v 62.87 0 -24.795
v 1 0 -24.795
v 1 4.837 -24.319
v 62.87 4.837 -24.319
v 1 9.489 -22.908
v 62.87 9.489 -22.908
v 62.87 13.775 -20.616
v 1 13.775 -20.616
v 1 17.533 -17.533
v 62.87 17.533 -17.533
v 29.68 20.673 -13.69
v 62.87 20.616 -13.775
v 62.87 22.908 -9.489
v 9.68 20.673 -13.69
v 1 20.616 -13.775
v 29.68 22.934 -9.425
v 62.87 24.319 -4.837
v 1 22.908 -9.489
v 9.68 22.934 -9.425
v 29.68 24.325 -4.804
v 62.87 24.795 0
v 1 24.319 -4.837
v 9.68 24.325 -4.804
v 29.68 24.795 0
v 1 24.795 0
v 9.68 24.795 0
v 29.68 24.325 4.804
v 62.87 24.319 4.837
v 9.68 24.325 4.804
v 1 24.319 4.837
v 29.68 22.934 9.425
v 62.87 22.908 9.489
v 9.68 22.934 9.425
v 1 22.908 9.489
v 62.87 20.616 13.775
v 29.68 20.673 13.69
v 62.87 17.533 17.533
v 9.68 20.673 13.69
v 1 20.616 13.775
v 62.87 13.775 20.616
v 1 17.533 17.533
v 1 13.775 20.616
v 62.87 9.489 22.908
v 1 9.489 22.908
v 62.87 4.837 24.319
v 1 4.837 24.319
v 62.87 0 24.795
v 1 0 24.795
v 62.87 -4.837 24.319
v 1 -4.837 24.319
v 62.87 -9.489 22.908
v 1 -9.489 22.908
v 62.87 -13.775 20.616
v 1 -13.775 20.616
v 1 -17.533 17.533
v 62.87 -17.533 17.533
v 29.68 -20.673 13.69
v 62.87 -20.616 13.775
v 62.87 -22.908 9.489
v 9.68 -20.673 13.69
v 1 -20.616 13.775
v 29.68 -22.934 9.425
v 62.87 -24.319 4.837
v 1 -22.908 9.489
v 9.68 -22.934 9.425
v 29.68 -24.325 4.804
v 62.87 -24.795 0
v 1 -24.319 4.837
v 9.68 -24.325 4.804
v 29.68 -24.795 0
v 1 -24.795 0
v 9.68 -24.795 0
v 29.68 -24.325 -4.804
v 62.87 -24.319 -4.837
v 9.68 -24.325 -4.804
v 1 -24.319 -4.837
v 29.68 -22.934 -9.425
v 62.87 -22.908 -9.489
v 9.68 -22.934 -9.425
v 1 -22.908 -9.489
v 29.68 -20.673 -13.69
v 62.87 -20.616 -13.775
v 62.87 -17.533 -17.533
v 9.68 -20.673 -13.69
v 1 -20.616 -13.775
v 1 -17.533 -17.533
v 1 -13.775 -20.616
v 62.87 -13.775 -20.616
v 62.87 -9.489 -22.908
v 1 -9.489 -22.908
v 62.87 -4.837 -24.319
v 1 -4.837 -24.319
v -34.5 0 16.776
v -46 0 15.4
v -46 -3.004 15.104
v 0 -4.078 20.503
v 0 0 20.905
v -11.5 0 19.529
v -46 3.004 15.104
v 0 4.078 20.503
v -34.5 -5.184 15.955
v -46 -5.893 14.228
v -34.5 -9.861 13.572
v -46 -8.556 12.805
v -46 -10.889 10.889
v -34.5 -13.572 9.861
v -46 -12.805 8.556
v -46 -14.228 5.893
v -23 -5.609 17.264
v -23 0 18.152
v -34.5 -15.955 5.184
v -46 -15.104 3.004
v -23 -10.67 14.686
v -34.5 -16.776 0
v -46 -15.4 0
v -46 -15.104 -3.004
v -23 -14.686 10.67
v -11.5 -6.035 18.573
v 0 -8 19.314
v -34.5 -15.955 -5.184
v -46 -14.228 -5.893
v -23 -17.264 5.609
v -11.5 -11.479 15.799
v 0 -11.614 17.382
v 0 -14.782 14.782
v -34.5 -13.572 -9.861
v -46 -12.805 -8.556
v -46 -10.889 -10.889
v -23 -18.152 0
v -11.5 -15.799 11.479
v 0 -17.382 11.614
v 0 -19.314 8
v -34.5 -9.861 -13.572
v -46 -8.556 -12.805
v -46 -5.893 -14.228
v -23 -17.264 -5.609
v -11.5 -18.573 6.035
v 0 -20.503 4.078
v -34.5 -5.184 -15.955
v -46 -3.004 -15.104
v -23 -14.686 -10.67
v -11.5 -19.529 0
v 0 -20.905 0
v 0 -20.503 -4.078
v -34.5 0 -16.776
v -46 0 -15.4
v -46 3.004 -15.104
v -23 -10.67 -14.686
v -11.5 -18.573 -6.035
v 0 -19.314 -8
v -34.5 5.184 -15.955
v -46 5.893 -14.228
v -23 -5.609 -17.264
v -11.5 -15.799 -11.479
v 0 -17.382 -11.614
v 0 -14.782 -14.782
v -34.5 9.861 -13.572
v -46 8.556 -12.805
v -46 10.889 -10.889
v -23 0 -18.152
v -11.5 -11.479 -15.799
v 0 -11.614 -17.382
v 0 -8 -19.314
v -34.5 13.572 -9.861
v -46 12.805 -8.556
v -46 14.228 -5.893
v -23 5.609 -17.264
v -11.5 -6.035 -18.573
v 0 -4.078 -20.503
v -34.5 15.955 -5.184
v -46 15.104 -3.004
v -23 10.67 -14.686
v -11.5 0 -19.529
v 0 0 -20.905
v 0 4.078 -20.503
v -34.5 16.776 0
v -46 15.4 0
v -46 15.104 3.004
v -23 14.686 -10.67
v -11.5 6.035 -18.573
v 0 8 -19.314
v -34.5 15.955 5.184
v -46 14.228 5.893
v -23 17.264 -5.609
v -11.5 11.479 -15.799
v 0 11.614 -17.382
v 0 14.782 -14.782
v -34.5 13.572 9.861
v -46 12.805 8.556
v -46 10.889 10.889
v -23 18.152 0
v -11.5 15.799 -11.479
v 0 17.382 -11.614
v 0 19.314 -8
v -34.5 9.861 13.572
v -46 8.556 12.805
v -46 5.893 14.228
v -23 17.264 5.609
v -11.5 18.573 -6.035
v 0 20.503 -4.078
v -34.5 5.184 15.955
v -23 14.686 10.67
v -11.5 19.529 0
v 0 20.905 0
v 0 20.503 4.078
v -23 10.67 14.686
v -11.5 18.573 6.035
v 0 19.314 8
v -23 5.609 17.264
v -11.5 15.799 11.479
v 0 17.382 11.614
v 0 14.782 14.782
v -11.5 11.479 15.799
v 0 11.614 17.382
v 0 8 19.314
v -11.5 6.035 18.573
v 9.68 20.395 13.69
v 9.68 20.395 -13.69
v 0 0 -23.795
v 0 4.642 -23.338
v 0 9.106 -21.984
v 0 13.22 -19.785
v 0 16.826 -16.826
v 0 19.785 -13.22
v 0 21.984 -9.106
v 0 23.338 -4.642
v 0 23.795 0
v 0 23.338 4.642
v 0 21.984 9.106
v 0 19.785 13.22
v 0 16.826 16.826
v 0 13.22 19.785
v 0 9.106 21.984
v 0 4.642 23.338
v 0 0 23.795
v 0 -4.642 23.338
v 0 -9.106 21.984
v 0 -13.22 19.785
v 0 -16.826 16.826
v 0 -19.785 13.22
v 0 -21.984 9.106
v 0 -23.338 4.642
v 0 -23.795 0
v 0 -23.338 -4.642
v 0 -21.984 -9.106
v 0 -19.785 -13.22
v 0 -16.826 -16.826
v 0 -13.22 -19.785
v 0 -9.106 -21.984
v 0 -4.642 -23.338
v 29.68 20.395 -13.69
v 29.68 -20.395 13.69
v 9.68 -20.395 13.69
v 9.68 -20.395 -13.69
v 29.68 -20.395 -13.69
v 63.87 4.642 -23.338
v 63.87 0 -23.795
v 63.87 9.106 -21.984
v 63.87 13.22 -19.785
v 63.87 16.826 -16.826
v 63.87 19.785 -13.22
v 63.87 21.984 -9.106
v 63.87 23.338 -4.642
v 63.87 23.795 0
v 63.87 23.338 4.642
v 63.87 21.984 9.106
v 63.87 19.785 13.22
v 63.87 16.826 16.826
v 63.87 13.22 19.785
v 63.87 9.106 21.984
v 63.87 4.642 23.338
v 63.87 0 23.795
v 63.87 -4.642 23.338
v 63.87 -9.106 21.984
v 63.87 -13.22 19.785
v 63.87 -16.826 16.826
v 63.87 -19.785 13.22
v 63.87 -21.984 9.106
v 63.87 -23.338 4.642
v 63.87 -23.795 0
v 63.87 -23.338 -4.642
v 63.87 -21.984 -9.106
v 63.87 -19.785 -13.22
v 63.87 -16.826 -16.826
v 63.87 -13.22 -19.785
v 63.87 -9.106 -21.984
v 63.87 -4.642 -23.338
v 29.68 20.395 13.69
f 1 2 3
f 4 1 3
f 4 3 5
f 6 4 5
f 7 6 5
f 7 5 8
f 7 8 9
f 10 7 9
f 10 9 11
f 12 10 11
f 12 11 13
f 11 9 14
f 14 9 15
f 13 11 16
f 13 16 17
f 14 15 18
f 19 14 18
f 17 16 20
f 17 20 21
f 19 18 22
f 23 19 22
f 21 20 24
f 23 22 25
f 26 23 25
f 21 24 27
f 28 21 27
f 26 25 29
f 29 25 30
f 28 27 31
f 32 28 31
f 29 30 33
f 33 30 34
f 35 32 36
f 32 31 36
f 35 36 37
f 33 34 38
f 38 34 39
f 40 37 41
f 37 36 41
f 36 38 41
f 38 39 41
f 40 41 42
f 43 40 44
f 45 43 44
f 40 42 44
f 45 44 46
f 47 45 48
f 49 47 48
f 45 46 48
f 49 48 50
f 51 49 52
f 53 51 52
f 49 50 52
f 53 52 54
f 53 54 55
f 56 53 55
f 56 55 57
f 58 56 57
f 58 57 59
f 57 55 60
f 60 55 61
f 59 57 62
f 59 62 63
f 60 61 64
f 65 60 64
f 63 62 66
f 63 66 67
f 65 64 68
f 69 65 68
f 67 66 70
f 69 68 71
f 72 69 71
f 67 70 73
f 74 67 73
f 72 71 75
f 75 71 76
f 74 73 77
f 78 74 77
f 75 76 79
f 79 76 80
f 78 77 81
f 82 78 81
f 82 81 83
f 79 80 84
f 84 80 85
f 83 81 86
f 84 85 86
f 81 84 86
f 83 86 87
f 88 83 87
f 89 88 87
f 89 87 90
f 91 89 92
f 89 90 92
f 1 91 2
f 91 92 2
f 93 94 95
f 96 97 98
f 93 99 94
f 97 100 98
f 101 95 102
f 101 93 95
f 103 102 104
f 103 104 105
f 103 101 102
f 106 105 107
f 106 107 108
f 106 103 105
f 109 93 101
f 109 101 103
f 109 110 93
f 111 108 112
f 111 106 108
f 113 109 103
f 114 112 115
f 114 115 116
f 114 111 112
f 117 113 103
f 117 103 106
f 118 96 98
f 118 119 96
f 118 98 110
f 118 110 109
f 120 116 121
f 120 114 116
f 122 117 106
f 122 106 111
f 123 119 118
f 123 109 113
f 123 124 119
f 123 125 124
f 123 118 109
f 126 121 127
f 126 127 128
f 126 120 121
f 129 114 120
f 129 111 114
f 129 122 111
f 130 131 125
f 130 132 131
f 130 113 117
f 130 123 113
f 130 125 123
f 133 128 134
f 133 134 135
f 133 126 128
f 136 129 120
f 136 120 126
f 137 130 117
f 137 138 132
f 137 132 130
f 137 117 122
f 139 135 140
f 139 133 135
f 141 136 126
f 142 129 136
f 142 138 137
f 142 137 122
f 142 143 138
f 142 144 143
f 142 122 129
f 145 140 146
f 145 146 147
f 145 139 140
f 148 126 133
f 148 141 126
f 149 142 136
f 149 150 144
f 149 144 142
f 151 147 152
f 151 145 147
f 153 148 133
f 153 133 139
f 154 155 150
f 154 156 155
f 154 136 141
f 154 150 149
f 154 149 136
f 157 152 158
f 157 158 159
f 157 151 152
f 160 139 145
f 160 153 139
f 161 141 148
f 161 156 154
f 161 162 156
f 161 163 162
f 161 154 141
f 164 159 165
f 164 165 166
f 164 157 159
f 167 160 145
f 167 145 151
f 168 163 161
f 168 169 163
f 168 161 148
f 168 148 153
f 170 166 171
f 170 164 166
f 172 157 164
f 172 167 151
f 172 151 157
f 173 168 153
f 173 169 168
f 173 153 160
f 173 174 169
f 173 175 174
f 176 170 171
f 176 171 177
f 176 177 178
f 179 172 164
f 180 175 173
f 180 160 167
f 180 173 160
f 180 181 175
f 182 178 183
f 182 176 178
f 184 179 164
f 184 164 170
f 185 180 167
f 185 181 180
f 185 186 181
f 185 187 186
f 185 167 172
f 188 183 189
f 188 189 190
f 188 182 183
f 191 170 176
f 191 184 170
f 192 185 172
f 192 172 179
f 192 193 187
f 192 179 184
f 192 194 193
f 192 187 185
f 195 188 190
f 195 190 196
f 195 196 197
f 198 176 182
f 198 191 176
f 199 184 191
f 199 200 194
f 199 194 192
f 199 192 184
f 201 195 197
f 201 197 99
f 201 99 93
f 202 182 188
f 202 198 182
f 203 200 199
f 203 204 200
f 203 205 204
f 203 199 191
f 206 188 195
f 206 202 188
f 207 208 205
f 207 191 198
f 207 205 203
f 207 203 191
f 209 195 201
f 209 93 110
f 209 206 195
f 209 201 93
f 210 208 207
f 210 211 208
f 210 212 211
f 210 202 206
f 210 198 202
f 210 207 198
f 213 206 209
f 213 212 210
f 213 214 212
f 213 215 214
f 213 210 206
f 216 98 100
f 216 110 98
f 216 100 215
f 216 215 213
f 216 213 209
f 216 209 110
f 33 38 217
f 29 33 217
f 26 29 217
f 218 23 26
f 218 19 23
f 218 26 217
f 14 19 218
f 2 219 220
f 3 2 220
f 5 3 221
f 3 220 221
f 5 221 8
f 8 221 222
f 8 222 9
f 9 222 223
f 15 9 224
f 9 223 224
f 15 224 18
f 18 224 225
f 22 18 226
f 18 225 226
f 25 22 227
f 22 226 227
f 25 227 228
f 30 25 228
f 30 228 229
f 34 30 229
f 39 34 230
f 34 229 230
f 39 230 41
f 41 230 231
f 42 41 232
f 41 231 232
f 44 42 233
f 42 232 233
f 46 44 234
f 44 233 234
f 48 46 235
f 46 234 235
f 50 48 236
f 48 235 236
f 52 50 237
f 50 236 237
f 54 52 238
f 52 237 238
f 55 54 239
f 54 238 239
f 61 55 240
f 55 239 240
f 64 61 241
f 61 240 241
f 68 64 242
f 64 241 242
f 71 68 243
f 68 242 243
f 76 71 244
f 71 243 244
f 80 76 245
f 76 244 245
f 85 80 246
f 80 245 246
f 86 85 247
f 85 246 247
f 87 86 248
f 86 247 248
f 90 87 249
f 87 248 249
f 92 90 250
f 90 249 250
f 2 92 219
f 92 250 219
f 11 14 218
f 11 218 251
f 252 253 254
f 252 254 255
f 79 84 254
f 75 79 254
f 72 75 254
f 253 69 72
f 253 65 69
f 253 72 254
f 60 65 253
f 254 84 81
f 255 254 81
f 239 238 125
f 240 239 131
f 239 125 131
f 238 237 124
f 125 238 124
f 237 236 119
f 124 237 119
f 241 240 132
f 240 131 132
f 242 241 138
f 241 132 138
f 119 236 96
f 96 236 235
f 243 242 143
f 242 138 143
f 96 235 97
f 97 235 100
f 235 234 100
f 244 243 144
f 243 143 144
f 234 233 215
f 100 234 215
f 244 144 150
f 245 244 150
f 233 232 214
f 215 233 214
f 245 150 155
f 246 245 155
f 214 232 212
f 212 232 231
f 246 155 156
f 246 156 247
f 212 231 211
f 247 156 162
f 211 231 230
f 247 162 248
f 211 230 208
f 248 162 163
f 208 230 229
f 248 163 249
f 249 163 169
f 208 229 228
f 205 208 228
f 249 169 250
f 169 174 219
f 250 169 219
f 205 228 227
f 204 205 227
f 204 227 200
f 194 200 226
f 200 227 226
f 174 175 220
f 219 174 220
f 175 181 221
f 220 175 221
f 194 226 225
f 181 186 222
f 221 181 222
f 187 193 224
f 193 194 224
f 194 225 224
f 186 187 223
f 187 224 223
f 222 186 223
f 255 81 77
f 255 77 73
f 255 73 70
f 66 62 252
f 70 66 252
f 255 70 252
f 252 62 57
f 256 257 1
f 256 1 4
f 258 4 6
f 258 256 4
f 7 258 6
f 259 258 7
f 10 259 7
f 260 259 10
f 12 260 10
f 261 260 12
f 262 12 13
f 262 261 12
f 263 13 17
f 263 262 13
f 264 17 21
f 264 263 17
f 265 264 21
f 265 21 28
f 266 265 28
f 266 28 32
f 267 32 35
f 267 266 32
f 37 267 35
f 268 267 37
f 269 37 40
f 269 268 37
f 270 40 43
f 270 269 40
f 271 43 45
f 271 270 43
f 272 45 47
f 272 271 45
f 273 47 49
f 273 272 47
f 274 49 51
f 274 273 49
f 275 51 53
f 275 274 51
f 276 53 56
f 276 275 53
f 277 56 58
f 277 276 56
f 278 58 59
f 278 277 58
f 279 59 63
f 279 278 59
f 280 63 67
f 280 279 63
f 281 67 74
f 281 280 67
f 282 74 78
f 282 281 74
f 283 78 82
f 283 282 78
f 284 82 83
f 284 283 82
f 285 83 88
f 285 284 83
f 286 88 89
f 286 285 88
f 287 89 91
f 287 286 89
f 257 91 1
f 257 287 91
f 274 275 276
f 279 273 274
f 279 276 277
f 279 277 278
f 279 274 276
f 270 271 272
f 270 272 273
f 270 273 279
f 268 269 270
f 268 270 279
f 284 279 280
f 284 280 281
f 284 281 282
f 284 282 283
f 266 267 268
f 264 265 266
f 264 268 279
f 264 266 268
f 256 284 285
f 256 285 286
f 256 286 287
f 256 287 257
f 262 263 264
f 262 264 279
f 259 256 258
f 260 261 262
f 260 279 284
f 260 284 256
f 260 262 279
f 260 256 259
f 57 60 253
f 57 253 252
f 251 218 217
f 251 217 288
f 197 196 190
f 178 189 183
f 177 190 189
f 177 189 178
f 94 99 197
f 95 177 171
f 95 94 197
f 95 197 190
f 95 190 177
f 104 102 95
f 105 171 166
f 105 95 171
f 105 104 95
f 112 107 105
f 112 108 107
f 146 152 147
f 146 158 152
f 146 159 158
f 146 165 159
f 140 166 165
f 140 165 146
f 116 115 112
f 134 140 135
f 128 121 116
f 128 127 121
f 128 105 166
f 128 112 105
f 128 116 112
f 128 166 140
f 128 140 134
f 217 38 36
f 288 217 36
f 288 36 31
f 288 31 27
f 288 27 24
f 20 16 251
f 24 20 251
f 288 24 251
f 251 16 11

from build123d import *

# Parameters (mm, degrees)
SKIZZE2_R                       = 24.795
AUFSATZ_LINEAR_AUSTRAGEN1_DEPTH = 63.87
SKIZZE8_W                       = 20
SKIZZE8_H                       = 27.38
SCHNITT_LINEAR_AUSTRAGEN1_DEPTH = 4.4
KREISMUSTER1_COUNT              = 2
FASE1_SIZE                      = 1


with BuildPart() as part:
    # Skizze1 → Rotation1 (revolve)
    with BuildSketch(Plane(origin=(0, 0, 0), x_dir=(1, 0, 0), z_dir=(0, 1, 0)), mode=Mode.PRIVATE) as rotation1_sk:
        Polygon((-46, 0), (-46, 15.4), (0, 20.905), (0, 0), align=None)
    revolve(rotation1_sk.sketch.rotate(Axis((-46, 0, 0), (1, 0, 0)), 180), axis=Axis((-46, 0, 0), (1, 0, 0)))  # turned: the seam where the file's is

    # Skizze2 → Aufsatz-Linear austragen1 (add)
    with BuildSketch(Plane(origin=(0, 0, 0), x_dir=(0, 0, -1), z_dir=(1, 0, 0))):
        Circle(SKIZZE2_R)
    extrude(amount=AUFSATZ_LINEAR_AUSTRAGEN1_DEPTH)

    # Skizze8 → Schnitt-Linear austragen1 (cut)
    with BuildSketch(Plane(origin=(0, 24.795, 0), x_dir=(1, 0, 0), z_dir=(0, 1, 0))):
        with Locations((19.68, 0)):
            Rectangle(SKIZZE8_W, SKIZZE8_H)
    schnitt_linear_austragen1 = extrude(amount=-SCHNITT_LINEAR_AUSTRAGEN1_DEPTH, mode=Mode.SUBTRACT)

    # Kreismuster1: Schnitt-Linear austragen1 ×2 about axis
    kreismuster1_axis = Axis((0, 0, 0), (1, 0, 0))
    for i in range(1, KREISMUSTER1_COUNT):
        add(schnitt_linear_austragen1.rotate(kreismuster1_axis, i * 360 / KREISMUSTER1_COUNT), mode=Mode.SUBTRACT)

    # Fase1
    fase1_edges = [part.edges().sort_by_distance(p)[0] for p in [
        (0, 0, 24.795),
        (63.87, 0, 24.795),
    ]]
    chamfer(fase1_edges, length=FASE1_SIZE)


solid = part.part
